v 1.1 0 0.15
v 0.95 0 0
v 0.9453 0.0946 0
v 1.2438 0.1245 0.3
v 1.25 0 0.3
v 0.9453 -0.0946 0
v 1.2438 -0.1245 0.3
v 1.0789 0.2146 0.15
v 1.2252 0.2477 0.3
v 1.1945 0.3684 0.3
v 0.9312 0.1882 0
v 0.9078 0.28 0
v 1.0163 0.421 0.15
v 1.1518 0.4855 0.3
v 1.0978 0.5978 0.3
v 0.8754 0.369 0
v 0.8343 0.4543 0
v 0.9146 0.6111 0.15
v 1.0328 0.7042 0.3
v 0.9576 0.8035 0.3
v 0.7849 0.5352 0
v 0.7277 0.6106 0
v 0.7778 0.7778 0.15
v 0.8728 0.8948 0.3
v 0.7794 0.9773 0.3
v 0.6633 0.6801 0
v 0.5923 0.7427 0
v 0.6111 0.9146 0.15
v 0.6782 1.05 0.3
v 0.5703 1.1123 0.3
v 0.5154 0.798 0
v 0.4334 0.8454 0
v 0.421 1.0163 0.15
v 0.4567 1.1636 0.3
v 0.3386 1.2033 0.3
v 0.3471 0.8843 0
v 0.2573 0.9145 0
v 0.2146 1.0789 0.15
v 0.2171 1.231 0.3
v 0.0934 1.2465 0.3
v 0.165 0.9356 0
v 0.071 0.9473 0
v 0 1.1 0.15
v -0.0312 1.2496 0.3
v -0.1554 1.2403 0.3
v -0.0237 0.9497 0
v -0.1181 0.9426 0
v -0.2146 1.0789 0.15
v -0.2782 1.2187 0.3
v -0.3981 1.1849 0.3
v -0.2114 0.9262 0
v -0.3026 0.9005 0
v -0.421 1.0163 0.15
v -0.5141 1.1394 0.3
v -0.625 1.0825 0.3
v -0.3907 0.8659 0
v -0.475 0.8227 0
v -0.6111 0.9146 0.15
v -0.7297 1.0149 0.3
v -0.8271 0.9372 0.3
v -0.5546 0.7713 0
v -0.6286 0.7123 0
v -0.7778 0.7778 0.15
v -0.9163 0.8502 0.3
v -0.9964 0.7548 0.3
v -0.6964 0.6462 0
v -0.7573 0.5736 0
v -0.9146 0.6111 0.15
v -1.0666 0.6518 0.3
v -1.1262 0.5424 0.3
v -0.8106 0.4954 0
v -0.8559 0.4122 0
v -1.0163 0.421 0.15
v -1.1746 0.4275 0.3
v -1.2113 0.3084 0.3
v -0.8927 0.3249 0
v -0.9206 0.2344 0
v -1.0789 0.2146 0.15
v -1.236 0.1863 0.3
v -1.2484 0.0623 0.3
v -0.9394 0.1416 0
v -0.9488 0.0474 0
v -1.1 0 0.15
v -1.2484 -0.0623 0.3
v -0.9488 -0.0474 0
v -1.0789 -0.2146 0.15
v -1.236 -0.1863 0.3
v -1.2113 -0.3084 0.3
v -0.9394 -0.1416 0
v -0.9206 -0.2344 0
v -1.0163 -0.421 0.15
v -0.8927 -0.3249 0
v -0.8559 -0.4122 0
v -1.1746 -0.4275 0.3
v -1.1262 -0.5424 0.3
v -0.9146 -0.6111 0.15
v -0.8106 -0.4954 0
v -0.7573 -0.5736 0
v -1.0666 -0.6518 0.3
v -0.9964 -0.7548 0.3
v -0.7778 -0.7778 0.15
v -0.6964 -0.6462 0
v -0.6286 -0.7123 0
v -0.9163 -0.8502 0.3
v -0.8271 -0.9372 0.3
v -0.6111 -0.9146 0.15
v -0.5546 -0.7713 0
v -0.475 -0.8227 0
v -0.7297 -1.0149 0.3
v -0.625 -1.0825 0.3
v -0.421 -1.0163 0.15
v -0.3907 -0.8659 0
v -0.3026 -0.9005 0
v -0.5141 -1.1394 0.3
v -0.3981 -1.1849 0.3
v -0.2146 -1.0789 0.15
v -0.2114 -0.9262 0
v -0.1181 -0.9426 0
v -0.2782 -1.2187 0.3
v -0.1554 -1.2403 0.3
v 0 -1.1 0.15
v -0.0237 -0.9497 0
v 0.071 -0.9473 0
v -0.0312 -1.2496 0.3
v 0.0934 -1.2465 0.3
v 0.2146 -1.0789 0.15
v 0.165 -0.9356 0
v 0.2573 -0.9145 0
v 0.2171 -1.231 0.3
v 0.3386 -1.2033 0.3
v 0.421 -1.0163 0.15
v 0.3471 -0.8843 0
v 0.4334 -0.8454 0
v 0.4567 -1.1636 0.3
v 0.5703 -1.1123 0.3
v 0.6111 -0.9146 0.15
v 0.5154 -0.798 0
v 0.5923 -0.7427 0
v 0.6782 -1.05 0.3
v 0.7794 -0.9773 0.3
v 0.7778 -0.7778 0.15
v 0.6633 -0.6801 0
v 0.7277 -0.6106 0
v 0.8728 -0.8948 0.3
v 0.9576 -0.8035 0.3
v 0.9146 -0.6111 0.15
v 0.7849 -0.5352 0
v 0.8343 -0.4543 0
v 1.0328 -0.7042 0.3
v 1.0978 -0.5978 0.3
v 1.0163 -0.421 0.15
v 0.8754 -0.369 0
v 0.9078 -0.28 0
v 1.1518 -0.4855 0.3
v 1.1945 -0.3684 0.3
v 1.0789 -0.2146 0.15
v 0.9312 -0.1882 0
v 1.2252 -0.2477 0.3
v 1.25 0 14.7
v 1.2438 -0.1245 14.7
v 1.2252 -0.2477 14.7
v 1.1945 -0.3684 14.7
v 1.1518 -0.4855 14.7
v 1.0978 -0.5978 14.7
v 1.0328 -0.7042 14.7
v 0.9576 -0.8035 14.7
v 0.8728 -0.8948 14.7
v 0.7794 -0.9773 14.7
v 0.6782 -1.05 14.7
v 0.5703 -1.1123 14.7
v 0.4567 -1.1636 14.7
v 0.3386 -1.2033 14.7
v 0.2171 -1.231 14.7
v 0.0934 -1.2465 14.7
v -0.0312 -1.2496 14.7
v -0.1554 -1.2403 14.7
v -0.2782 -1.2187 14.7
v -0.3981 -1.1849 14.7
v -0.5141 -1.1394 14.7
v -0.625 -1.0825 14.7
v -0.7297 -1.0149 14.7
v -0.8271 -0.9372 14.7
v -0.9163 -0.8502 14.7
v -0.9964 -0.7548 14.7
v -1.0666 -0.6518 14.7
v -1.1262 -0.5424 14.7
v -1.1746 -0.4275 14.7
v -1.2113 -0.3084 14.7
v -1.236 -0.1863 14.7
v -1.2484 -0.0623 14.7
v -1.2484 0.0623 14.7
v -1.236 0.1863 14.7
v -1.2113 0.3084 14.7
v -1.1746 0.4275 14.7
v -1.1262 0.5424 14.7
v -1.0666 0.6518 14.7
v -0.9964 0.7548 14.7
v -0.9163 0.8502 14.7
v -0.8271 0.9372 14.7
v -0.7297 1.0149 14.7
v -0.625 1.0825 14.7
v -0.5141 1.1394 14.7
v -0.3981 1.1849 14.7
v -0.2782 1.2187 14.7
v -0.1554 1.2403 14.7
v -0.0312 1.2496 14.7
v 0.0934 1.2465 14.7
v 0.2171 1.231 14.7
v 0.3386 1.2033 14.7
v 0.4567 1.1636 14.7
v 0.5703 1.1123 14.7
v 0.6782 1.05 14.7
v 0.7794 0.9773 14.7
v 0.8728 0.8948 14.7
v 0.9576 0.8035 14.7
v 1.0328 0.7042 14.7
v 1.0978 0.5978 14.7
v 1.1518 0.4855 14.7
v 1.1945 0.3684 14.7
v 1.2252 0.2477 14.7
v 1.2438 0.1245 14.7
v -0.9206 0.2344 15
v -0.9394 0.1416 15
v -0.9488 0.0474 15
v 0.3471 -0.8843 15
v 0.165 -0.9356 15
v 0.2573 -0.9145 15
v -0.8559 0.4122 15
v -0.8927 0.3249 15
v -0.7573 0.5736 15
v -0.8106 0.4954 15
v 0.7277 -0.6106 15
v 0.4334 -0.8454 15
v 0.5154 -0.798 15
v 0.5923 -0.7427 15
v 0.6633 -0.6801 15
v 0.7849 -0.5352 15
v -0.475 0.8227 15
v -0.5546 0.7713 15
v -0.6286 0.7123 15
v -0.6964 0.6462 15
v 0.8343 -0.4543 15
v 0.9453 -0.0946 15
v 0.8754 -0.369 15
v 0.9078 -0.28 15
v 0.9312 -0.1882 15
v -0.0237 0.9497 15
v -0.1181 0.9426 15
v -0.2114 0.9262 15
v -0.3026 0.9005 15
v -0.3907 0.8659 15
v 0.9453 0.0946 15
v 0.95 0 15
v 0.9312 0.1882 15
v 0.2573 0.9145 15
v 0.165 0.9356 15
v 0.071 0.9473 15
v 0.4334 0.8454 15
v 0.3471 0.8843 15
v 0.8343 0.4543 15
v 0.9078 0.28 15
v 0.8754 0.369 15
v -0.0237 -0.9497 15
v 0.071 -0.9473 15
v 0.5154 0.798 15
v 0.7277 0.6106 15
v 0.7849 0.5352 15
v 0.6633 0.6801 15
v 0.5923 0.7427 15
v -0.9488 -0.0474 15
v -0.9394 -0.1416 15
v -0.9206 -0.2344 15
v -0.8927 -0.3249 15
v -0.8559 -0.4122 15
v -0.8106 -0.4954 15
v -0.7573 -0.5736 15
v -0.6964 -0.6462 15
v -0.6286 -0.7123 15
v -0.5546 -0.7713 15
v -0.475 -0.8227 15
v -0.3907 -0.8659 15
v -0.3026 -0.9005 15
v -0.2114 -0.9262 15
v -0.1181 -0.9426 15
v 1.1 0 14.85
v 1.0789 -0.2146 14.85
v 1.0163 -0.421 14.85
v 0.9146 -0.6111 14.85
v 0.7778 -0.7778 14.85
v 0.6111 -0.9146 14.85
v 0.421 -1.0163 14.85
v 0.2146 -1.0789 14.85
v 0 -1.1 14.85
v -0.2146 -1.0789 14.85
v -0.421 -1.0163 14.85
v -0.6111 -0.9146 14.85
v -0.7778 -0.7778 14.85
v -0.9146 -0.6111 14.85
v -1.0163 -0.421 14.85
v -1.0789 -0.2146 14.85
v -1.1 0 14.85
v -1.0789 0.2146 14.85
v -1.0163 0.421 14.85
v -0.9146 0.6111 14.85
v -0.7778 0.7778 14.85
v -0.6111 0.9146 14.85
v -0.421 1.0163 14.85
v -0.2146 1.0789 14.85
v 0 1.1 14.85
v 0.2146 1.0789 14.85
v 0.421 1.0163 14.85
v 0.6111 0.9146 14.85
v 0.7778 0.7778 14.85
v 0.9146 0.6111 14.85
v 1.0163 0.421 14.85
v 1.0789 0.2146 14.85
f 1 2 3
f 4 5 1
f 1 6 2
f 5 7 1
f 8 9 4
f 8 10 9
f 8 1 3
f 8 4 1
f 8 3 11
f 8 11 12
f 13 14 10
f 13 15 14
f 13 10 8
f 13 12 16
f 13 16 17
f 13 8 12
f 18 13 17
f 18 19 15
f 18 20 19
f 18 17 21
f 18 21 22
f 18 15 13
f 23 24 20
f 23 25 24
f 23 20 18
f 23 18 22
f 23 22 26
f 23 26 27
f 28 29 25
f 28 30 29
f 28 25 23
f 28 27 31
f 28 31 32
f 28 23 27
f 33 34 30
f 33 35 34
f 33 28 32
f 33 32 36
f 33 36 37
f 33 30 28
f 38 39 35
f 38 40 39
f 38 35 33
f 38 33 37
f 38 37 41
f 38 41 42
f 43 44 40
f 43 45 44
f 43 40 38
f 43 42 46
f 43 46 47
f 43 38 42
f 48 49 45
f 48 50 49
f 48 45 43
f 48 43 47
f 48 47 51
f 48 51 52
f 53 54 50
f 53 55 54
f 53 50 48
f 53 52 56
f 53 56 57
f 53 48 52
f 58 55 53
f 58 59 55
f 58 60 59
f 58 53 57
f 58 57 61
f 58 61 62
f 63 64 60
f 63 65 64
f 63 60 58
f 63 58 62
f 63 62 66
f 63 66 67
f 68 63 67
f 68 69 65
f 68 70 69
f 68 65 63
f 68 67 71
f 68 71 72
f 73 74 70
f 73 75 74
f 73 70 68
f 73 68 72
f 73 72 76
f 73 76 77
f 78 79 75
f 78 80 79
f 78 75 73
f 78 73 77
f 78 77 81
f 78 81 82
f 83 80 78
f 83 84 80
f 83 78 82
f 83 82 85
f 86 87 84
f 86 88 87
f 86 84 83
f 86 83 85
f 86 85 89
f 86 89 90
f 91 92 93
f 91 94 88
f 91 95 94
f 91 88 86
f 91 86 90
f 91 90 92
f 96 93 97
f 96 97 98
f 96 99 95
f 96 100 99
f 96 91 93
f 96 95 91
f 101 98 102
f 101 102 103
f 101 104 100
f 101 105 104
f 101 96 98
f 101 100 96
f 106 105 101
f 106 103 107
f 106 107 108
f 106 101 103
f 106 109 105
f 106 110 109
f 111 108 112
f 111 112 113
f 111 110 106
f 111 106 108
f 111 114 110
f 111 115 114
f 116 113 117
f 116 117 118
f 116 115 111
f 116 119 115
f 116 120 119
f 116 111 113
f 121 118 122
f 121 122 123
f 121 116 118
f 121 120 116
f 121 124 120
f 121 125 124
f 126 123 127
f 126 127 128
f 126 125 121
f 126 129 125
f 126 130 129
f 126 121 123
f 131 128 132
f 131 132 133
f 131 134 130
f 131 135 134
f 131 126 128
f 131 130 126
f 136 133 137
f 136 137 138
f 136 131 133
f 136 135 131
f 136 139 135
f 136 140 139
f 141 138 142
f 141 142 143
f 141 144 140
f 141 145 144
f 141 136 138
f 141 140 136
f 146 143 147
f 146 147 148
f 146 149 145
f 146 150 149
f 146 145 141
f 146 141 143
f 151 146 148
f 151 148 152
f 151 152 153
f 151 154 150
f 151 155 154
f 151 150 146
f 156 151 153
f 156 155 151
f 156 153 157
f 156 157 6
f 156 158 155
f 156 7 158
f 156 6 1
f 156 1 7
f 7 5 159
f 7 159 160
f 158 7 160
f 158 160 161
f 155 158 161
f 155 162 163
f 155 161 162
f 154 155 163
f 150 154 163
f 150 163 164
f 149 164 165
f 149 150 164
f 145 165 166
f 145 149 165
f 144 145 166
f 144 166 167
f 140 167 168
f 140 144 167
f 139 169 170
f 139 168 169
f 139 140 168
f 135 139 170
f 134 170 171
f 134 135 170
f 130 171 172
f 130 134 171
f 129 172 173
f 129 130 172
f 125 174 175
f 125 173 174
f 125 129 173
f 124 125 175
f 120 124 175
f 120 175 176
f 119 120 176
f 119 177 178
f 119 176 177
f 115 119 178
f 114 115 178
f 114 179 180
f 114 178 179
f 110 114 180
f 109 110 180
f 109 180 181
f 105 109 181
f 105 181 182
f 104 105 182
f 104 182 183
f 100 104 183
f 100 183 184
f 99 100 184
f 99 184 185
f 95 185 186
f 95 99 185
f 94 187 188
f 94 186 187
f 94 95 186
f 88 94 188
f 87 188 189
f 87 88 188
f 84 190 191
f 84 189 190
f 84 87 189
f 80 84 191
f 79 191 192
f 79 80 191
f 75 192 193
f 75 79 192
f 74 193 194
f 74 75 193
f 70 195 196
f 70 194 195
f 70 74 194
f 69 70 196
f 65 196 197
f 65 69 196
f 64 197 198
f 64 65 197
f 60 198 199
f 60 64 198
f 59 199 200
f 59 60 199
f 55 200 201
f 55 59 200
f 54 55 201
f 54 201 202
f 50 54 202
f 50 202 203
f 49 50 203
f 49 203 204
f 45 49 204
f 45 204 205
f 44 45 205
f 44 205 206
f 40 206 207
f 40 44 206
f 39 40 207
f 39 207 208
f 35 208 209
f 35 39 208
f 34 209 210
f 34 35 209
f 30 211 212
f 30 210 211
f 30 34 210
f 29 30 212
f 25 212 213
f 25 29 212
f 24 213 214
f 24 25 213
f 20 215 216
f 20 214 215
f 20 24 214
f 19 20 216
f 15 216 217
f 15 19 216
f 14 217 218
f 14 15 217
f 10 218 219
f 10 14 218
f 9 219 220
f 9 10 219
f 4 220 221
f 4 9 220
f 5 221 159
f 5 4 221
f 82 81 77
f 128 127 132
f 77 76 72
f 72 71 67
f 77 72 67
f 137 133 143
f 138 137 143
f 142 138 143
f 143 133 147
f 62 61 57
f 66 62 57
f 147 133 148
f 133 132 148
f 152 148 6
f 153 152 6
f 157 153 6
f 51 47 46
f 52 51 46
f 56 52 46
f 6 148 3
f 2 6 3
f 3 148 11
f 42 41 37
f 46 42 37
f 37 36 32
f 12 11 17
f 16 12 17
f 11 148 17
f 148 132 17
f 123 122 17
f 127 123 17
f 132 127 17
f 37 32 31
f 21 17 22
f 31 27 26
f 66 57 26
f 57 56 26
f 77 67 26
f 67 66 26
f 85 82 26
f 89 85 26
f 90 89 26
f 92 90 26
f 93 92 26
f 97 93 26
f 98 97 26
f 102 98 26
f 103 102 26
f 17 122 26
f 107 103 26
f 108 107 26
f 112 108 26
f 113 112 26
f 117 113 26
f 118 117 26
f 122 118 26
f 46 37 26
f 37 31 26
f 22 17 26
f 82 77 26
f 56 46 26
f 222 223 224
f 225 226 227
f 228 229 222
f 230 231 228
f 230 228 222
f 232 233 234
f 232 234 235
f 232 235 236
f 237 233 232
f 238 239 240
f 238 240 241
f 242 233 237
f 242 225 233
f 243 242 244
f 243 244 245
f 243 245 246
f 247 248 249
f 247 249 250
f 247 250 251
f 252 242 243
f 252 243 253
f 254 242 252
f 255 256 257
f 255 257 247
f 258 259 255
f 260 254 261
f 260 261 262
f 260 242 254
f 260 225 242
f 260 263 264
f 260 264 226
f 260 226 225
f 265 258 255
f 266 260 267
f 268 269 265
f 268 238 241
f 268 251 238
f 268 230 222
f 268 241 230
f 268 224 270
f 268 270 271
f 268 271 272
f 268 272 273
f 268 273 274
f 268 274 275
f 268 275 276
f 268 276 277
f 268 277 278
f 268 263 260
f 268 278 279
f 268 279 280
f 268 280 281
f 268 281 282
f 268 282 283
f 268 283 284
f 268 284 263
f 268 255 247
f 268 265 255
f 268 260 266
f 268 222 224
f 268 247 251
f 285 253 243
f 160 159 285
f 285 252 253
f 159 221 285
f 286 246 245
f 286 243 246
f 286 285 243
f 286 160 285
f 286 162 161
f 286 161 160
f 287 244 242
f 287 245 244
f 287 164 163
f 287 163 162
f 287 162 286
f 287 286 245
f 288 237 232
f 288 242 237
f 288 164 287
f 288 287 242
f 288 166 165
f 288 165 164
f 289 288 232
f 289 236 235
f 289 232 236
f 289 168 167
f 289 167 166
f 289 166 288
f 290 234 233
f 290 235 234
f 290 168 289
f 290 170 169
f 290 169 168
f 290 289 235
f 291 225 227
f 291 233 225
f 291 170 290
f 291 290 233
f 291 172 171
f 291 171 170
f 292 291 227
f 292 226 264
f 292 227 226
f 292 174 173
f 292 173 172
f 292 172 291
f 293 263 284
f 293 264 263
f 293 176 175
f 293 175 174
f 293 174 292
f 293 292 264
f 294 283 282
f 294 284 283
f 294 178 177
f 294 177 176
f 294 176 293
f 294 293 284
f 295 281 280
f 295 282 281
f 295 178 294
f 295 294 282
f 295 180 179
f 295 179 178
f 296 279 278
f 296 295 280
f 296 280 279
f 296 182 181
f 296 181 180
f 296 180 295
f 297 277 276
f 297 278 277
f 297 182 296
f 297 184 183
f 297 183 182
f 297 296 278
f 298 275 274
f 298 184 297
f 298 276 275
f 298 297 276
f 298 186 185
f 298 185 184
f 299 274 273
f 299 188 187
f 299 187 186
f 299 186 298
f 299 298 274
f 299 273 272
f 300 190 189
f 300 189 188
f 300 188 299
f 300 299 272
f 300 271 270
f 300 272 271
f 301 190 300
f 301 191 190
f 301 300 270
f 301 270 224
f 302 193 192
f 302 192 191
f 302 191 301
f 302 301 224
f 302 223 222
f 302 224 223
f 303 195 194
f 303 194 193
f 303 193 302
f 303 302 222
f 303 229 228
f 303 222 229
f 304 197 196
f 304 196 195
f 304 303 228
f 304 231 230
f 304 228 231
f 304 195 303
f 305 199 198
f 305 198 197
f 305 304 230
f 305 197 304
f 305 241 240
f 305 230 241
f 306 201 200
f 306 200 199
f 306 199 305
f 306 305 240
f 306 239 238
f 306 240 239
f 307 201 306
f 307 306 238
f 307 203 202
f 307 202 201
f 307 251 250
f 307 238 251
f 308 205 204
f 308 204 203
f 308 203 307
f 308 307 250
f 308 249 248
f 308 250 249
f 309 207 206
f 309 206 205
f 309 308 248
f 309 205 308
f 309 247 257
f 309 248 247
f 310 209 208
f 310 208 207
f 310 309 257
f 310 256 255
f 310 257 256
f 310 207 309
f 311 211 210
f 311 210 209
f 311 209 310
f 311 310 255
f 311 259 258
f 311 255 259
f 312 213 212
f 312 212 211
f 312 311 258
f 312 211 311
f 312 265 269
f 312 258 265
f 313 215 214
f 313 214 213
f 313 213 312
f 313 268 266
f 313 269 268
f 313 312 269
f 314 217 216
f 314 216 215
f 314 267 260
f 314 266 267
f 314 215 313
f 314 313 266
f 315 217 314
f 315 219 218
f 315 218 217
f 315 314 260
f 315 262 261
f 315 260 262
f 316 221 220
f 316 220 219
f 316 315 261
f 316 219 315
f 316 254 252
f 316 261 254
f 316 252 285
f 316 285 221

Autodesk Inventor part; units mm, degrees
ref_plane "YZ Plane" through (0, 0, 0) normal (1, 0, 0) x (0, 1, 0)
ref_plane "XZ Plane" through (0, 0, 0) normal (0, 1, 0) x (-1, 0, 0)
ref_plane "XY Plane" through (0, 0, 0) normal (0, 0, 1) x (1, 0, 0)
sketch "スケッチ1" plane through (0, 0, 0) normal (0, 0, 1) x (1, 0, 0)
  circle A0 centre (0, 0) radius 1.25
  dimension "d0" = 2.5
extrude "押し出し1" add sketch "スケッチ1" along normal blind 15
chamfer "面取り1" distance 0.3 angle 45 1 edges at (-1.25, 0, 15)
chamfer "面取り2" distance 0.3 angle 45 1 edges at (-1.25, 0, 0)
properties part number "平行ピン15mm" material "鋼、高強度、低合金"
